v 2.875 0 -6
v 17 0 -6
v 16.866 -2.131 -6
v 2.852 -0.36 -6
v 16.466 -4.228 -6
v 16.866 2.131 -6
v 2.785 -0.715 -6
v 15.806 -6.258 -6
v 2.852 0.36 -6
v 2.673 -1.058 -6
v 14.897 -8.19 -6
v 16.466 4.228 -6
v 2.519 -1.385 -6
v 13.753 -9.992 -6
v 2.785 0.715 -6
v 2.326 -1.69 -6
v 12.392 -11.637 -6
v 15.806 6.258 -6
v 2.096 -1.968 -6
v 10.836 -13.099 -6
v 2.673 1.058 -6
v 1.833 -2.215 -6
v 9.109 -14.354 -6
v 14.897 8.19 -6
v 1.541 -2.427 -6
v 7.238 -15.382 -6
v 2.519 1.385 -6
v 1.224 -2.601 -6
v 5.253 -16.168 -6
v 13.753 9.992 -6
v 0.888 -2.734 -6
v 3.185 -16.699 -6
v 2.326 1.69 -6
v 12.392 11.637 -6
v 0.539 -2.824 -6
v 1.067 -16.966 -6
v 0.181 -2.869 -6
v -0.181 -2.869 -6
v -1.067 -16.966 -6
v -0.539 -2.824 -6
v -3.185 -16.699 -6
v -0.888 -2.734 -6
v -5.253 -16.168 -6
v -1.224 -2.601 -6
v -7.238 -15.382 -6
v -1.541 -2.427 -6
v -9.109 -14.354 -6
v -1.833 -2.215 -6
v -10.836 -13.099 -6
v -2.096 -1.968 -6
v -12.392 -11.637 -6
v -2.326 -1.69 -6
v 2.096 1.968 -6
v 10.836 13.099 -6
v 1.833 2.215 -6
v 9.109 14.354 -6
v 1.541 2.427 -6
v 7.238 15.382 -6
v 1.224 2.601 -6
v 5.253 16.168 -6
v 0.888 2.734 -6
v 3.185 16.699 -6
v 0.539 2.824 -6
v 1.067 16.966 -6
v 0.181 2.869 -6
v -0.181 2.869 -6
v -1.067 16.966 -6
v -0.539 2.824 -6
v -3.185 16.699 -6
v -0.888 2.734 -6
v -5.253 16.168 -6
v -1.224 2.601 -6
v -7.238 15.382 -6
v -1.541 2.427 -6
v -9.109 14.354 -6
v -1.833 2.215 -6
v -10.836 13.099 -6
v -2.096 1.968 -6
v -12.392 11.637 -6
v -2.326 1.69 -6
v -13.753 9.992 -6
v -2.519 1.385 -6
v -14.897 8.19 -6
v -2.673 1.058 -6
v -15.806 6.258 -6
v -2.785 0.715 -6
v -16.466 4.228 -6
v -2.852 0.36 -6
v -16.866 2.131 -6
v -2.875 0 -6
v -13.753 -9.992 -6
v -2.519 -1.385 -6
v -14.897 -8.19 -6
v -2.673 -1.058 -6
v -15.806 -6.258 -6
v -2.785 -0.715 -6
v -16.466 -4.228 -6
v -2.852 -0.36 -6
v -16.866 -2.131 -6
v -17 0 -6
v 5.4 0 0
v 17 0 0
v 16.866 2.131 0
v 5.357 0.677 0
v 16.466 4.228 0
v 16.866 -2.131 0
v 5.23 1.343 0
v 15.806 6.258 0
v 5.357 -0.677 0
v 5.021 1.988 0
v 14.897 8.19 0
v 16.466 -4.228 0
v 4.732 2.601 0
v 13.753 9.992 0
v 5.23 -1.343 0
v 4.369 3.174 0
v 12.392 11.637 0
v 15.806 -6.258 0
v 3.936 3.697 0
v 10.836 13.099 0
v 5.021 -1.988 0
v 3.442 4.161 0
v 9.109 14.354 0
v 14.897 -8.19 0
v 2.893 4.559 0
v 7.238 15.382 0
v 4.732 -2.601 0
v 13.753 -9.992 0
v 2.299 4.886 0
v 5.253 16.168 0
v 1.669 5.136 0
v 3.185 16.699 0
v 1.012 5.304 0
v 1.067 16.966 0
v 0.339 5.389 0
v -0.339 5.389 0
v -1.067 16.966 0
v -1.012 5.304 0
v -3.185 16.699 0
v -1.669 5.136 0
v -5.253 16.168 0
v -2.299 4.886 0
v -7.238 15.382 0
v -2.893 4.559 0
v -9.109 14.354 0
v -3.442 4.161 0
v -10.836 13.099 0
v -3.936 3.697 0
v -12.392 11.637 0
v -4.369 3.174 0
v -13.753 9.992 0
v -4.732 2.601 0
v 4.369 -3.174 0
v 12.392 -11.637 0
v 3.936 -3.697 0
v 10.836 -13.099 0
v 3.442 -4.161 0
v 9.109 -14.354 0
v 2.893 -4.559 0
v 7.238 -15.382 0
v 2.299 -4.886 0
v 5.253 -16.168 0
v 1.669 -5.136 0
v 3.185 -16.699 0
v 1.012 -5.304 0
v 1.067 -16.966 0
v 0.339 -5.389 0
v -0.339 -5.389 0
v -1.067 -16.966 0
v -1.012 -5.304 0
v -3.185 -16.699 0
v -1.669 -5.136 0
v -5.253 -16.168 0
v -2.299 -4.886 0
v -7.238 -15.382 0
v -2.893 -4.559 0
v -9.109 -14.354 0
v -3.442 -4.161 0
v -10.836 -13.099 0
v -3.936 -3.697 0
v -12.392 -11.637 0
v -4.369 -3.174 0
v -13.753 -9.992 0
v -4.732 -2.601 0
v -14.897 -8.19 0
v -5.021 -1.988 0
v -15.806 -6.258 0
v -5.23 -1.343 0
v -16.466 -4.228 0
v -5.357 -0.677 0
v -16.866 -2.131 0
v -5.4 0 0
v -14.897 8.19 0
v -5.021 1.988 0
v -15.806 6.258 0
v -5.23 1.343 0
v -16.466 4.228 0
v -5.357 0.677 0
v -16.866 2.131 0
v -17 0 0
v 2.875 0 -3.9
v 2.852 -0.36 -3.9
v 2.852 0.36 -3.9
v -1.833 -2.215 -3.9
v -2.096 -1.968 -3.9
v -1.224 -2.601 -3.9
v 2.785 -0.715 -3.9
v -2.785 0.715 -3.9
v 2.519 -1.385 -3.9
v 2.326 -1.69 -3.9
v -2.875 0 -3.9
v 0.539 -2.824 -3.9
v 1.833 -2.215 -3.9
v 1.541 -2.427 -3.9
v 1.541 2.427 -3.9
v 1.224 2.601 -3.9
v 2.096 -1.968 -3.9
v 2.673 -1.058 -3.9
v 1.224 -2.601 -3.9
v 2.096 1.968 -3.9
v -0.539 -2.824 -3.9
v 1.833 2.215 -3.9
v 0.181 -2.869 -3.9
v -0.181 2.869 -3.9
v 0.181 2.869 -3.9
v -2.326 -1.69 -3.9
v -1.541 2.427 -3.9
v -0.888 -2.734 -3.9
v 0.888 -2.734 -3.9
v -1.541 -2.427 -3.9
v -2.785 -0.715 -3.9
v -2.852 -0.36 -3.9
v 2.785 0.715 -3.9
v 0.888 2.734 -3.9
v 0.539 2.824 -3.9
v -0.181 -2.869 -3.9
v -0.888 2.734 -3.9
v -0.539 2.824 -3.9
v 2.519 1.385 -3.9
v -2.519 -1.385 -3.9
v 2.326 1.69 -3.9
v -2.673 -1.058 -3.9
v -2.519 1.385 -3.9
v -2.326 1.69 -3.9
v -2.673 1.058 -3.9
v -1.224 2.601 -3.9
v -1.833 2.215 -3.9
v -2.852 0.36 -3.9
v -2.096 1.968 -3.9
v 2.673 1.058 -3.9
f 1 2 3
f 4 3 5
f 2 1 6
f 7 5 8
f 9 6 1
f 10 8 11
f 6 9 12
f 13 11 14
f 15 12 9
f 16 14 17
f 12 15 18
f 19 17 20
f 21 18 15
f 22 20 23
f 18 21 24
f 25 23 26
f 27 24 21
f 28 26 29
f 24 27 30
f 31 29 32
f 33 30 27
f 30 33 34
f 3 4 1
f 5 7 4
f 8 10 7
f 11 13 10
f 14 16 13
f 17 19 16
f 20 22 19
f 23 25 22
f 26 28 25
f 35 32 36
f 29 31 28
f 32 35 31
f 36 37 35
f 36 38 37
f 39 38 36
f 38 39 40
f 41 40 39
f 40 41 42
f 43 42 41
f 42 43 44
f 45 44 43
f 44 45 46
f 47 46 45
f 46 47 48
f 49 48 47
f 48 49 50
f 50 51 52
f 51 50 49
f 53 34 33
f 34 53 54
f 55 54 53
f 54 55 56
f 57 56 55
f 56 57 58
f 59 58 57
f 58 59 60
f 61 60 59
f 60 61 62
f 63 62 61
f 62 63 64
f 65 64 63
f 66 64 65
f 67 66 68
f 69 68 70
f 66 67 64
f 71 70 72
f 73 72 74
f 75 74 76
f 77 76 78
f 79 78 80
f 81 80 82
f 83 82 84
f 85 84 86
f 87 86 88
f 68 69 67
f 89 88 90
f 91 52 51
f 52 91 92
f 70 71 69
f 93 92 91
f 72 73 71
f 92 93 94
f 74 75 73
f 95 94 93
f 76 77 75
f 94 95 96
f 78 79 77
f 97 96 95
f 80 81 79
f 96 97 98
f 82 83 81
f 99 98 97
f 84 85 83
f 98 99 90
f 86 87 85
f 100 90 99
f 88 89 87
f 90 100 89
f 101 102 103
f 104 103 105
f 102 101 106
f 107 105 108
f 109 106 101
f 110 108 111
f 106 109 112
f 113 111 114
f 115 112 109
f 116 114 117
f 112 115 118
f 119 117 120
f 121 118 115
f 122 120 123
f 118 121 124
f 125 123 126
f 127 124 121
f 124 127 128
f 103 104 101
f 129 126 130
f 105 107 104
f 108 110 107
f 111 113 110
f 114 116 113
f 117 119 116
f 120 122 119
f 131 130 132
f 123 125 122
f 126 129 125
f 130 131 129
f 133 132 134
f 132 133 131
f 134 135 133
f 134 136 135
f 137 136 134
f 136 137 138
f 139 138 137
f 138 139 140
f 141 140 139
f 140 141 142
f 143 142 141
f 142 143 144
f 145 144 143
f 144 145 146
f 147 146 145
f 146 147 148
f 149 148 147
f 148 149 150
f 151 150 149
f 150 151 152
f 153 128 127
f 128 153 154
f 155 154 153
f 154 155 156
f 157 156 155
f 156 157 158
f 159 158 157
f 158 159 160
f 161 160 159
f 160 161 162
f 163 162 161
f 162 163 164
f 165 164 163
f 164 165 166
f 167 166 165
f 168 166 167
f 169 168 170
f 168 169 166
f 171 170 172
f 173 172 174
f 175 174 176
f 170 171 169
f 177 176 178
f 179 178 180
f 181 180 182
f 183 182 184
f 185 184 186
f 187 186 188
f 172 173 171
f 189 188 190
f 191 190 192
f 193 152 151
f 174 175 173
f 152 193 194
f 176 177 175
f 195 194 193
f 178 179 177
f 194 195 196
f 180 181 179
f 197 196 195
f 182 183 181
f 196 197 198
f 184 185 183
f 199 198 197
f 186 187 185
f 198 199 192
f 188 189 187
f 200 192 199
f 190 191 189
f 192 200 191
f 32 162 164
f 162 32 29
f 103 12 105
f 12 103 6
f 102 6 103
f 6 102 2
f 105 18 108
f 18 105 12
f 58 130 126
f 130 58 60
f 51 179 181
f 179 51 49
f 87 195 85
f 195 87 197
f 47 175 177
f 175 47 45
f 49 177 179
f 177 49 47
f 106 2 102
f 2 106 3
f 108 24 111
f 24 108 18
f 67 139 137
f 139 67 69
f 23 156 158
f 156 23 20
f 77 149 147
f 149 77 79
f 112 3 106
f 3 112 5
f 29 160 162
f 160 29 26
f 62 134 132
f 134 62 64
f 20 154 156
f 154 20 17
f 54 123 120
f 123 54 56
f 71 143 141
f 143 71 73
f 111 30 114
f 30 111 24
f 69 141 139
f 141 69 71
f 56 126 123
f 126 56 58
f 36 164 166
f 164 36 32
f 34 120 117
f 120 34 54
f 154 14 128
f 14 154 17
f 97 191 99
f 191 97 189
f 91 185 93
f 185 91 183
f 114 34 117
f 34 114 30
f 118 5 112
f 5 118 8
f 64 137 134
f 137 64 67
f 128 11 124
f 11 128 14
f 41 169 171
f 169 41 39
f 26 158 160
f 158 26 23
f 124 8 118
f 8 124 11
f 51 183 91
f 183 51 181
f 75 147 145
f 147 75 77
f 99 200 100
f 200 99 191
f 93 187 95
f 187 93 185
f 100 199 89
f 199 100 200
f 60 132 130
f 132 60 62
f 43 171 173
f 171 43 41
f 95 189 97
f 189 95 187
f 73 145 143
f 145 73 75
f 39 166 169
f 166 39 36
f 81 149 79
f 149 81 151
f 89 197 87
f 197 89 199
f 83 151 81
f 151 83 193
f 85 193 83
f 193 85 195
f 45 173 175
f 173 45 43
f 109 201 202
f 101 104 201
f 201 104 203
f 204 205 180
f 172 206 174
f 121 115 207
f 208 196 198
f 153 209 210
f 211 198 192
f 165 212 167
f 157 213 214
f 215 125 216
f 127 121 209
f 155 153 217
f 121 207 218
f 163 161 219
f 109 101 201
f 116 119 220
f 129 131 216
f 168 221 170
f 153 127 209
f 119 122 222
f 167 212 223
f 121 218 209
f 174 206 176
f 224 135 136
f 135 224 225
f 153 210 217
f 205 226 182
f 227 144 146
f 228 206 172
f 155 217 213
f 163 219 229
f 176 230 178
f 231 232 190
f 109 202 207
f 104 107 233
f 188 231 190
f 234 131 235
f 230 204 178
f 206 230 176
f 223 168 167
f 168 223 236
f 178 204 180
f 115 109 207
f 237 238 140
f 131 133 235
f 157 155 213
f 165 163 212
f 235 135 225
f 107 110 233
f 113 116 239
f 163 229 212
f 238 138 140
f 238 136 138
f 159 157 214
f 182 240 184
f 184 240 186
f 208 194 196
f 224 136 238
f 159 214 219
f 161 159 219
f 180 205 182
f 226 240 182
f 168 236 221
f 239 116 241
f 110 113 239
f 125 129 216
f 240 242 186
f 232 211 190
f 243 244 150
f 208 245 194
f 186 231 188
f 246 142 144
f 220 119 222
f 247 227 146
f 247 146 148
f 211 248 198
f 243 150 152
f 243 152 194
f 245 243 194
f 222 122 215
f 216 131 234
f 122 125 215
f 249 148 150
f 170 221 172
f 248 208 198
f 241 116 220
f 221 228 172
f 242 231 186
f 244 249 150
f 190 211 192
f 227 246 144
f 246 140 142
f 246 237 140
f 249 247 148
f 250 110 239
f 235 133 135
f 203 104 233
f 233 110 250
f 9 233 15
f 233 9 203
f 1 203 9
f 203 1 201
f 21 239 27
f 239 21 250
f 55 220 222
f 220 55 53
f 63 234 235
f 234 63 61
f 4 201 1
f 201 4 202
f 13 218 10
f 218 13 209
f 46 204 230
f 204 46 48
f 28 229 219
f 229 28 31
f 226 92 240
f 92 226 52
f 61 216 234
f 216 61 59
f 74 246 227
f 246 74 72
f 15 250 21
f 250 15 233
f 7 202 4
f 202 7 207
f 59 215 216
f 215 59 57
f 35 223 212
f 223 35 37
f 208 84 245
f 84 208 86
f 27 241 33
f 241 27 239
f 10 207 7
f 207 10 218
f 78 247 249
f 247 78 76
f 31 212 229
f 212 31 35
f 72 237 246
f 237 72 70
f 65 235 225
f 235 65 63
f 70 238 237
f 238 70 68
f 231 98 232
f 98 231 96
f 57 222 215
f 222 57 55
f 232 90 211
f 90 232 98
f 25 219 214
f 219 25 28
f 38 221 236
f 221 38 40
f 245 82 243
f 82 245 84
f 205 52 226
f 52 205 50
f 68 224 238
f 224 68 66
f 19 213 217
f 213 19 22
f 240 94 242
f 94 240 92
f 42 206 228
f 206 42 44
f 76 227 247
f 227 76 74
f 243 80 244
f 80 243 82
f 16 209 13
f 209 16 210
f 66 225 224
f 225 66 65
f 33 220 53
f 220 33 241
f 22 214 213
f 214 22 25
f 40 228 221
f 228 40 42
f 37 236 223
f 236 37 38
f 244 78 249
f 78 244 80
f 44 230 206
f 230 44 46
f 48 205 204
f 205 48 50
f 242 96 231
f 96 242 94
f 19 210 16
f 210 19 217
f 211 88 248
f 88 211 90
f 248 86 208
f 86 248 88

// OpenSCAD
$fn = 50;


difference() {
	union() {
		translate(v = [0, 0, -6.0000000000]) {
			cylinder(h = 6, r = 7.0000000000);
		}
		translate(v = [0, 0, -6.0000000000]) {
			cylinder(h = 6, r = 17.0000000000);
		}
	}
	union() {
		translate(v = [0, 0, 0]) {
			rotate(a = [0, 0, 0]) {
				difference() {
					union() {
						#translate(v = [0, 0, -6.0000000000]) {
							cylinder(h = 6, r = 2.6000000000);
						}
						#translate(v = [0, 0, -3.9000000000]) {
							cylinder(h = 3.9000000000, r1 = 2.8750000000, r2 = 5.4000000000);
						}
						#translate(v = [0, 0, -6.0000000000]) {
							cylinder(h = 6, r = 2.8750000000);
						}
						#translate(v = [0, 0, -6.0000000000]) {
							cylinder(h = 6, r = 2.6000000000);
						}
					}
					union();
				}
			}
		}
	}
}
